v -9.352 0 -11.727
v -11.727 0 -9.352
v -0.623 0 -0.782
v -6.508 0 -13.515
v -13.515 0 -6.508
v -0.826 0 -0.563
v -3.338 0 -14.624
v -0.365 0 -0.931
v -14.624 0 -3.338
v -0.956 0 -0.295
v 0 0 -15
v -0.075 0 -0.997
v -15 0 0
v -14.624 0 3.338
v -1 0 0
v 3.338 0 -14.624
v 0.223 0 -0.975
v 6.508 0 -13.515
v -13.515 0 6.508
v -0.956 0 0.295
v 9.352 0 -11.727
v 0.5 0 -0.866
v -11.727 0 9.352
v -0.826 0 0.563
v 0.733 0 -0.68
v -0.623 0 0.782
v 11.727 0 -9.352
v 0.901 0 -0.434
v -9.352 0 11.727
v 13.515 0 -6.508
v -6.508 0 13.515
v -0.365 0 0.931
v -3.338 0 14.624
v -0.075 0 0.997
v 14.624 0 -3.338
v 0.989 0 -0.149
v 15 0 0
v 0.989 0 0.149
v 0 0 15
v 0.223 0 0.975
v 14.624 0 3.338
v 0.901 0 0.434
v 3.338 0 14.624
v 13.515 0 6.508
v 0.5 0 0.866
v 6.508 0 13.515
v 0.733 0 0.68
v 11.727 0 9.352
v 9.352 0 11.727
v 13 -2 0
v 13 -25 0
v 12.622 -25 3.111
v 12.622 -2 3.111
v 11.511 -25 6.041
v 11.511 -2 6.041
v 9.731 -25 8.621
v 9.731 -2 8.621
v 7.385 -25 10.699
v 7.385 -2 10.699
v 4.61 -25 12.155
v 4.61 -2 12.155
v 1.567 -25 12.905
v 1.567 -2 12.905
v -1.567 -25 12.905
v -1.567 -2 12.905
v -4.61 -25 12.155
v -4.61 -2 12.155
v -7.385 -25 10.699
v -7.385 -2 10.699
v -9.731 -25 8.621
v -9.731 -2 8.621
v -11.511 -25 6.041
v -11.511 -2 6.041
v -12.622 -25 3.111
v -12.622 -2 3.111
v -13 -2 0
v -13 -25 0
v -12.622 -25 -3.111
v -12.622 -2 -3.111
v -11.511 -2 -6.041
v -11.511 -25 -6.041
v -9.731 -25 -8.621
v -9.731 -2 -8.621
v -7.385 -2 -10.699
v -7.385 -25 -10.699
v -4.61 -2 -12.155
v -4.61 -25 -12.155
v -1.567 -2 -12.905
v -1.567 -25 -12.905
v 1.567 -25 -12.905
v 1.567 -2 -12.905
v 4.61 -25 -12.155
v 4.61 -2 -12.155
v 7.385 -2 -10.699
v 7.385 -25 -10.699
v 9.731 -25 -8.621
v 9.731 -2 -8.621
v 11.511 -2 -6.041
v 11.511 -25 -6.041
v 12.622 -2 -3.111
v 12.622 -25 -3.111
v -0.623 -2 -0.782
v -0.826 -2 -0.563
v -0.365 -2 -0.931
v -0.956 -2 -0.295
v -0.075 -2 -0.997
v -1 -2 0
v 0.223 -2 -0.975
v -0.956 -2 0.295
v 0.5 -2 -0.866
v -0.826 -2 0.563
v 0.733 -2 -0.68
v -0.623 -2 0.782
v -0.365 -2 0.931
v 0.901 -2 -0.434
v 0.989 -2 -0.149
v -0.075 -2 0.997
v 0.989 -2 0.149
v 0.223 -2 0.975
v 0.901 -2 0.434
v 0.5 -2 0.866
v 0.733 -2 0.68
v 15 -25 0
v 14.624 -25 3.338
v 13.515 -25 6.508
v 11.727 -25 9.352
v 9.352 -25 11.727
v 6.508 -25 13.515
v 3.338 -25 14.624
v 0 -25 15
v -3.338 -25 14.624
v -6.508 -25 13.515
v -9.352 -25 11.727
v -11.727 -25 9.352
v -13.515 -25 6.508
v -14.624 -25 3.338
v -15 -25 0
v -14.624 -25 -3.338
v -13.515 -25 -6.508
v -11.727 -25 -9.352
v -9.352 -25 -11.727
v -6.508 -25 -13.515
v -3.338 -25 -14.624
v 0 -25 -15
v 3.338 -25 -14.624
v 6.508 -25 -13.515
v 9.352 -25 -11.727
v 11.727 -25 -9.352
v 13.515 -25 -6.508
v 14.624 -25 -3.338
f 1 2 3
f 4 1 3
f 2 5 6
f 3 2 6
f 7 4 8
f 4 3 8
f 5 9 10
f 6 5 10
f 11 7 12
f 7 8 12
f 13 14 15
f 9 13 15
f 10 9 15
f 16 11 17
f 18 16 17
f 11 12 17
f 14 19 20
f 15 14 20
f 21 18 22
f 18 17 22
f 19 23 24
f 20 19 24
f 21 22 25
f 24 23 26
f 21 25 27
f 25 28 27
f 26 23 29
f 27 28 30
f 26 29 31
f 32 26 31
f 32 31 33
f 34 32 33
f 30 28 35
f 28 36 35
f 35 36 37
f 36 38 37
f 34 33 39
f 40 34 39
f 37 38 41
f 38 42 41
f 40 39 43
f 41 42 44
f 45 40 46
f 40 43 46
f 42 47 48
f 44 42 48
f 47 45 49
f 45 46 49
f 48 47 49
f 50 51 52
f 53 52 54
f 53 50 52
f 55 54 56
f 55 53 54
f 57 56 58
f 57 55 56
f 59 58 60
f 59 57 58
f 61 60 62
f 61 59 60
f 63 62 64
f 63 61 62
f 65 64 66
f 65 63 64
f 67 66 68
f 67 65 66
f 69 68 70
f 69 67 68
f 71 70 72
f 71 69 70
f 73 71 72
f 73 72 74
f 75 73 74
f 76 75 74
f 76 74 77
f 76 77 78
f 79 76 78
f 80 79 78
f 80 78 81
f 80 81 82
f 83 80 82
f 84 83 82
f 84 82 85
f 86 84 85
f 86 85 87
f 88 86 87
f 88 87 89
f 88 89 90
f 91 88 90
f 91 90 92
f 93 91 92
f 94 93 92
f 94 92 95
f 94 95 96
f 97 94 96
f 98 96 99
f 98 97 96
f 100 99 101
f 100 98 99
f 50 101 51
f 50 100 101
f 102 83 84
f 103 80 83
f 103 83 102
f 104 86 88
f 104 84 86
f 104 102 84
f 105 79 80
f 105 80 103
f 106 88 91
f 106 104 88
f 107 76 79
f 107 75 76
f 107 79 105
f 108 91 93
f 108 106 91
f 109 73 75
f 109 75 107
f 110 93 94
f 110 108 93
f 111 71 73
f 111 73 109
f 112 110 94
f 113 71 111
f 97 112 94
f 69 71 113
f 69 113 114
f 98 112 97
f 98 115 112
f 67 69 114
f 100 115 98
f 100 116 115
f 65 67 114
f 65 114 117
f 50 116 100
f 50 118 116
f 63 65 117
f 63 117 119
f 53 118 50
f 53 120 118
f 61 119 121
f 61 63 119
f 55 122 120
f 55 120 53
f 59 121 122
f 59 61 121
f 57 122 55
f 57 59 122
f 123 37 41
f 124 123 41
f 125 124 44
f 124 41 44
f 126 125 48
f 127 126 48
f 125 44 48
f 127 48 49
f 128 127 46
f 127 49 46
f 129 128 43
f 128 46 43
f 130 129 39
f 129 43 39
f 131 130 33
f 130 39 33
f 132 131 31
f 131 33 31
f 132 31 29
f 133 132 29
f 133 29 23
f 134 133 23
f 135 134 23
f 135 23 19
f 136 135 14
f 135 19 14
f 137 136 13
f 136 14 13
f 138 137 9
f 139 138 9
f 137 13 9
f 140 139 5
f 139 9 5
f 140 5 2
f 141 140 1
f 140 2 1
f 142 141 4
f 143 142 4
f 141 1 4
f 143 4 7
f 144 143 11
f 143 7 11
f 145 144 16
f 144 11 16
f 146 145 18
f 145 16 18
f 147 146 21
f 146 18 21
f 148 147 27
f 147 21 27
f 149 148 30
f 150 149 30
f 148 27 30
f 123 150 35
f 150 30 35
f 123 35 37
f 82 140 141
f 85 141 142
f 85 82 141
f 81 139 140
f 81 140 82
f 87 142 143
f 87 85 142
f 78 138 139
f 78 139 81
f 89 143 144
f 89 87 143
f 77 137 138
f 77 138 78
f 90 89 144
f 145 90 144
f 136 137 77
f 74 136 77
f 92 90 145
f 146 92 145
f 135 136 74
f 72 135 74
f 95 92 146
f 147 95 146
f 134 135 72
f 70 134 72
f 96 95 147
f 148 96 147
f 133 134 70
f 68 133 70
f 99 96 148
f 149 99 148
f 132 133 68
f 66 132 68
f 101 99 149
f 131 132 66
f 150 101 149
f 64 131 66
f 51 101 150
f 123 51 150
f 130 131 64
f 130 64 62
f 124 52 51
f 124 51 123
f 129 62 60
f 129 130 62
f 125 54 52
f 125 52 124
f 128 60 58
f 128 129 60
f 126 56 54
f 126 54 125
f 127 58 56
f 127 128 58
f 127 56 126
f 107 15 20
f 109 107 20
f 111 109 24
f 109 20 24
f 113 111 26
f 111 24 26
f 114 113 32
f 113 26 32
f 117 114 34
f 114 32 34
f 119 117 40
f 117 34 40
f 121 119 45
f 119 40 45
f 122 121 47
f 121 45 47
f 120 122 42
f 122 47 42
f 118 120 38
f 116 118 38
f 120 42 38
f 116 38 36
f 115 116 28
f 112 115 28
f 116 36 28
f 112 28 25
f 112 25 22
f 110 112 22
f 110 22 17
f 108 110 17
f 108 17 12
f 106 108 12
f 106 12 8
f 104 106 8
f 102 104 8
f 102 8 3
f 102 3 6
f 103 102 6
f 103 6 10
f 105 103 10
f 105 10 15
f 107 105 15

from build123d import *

# Parameters (mm, degrees)
F0_R     = 15
F1_DEPTH = 25
F3_D     = 25.1
F3_DEPTH = 20
F3_TIP   = 7.5408007688
F5_R     = 15
F6_DEPTH = 25
F8_T     = -2
F9_D     = 2


with BuildPart() as f1:
    # F0 (on Front) → F1 (new body)
    with BuildSketch(Plane.XZ):
        Circle(F0_R)
    extrude(amount=F1_DEPTH)

    # F3
    with Locations(Plane.XZ.offset(25)):
        with Locations((0, 0)):
            Hole(F3_D / 2, depth=F3_DEPTH)
            with Locations((0, 0, -(F3_DEPTH + F3_TIP / 2))):  # 118° drill point
                Cone(0, F3_D / 2, F3_TIP, mode=Mode.SUBTRACT)


with BuildPart() as f6:
    # F5 (on Front) → F6 (new body)
    with BuildSketch(Plane.XZ):
        Circle(F5_R)
    extrude(amount=F6_DEPTH)

    # F8
    f8_openings = [f6.faces().sort_by_distance(p)[0] for p in [
        (0, -25, 0),
    ]]
    offset(amount=F8_T, openings=f8_openings)

    # F9 (through all)
    with Locations(Plane.XZ.offset(25)):
        with Locations((0, 0)):
            Hole(F9_D / 2)


solid = f6.part
